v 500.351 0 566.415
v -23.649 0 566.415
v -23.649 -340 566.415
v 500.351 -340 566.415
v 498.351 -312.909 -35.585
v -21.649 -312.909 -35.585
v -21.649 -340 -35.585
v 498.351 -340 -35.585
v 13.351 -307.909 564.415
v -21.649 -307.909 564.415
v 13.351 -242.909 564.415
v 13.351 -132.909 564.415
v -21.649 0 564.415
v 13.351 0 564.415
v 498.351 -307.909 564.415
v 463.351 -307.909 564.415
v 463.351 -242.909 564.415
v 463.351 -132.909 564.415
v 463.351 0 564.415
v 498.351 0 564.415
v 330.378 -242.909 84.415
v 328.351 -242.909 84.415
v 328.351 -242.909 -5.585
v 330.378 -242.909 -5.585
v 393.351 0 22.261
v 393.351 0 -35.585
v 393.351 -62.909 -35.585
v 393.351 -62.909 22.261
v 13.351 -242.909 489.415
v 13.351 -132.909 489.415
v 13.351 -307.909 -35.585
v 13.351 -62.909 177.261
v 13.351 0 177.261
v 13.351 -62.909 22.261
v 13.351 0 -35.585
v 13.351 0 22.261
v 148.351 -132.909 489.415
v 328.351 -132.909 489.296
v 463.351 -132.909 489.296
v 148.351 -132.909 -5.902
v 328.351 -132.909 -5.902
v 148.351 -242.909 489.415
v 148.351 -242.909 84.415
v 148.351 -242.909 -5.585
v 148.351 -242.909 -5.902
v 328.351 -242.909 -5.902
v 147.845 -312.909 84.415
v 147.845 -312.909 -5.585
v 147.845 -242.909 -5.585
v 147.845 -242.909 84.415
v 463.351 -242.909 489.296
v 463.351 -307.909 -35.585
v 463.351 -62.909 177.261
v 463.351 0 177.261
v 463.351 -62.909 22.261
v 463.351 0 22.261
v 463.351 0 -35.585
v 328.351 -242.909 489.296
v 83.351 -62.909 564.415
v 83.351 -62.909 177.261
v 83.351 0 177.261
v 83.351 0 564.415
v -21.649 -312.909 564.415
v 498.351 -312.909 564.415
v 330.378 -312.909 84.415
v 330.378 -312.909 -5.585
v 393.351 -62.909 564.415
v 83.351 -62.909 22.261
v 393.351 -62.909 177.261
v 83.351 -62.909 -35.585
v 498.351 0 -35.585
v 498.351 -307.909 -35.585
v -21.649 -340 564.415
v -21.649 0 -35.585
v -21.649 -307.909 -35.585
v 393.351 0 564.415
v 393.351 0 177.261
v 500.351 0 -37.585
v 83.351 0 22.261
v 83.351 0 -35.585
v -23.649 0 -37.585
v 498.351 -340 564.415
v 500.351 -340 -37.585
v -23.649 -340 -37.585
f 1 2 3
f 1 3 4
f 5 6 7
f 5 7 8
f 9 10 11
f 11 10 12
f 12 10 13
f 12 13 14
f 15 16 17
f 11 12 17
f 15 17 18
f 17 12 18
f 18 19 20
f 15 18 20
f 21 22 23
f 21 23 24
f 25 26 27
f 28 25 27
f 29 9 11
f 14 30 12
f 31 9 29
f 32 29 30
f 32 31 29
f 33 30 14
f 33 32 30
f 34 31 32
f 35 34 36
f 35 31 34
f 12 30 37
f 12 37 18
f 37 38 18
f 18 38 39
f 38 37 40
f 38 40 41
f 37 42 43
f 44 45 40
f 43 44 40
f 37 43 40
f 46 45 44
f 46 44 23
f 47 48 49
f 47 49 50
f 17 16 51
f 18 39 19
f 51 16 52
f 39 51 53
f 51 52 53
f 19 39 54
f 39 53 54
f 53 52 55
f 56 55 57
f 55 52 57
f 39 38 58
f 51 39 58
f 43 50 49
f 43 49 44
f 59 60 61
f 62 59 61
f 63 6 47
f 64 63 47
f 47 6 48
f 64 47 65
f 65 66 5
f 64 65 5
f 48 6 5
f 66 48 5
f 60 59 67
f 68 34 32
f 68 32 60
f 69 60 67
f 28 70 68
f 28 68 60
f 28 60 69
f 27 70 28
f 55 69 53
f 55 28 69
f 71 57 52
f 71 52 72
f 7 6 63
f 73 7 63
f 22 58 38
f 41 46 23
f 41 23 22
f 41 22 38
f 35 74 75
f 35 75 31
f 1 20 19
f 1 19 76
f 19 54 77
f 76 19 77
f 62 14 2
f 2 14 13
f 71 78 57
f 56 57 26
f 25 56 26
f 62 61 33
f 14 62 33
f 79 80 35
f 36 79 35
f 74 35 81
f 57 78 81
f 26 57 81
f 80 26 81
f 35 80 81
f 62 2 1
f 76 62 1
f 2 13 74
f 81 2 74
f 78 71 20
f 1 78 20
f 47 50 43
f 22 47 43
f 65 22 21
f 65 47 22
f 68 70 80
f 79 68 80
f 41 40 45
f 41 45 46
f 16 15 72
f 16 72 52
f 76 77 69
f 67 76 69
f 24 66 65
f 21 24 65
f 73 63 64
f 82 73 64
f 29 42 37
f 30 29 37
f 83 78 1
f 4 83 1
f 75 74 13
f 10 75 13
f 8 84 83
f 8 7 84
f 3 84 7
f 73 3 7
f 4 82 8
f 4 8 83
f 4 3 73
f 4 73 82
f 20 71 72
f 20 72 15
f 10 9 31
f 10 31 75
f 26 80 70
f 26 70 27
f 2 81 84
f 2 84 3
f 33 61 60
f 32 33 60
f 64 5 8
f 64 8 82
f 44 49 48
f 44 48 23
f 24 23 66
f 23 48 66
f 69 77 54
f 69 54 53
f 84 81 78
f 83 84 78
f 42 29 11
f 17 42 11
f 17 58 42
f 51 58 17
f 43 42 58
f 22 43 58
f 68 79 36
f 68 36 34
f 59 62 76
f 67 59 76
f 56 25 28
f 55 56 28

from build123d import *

# Parameters (mm, degrees)
F0_W      = 524
F0_H      = 604
F0_W_2    = 520
F0_H_2    = 600
F1_DEPTH  = 340
F2_W      = 310
F2_H      = 240
F2_W_2    = 180
F2_H_2    = 110
F2_H_3    = 5
F3_DEPTH  = 600
F2_W_3    = 65
F2_H_4    = 307.9086494446
F4_DEPTH  = 600
F5_DEPTH  = 600
F6_W      = 182.5336068869
F6_H      = 90
F7_DEPTH  = 70
F8_W      = 180
F8_H      = 29.6823031265
F9_DEPTH  = 110
F10_W     = 62.9086494446
F10_H     = 155
F11_DEPTH = 70
F12_DEPTH = 380
F13_W     = 110
F13_H     = 75
F14_DEPTH = 140
F15_W     = 110
F15_H     = 75.1196961854
F16_DEPTH = 140


with BuildPart() as f1:
    # F0 (on Front) → F1 (new body)
    with BuildSketch(Plane.XZ):
        with Locations((238.3513055446, 264.4152384256)):
            Rectangle(F0_W, F0_H)
        with Locations((238.3513055446, 264.4152384256)):
            Rectangle(F0_W_2, F0_H_2, mode=Mode.SUBTRACT)
    extrude(amount=F1_DEPTH)

    # F2 (on face) → F3 (join)
    with BuildSketch(Plane.XY.offset(-35.5847615744)):
        Polygon((-21.6486944554, -307.9086494446), (-21.6486944554, -312.9086494446), (498.3513055446, -312.9086494446), (498.3513055446, -307.9086494446), (463.3513055446, -307.9086494446), (398.3513055446, -307.9086494446), (393.3513055446, -307.9086494446), (83.3513055446, -307.9086494446), (78.3513055446, -307.9086494446), (13.3513055446, -307.9086494446), align=None)
        with Locations((238.3513055446, -187.9086494446)):
            Rectangle(F2_W, F2_H)
        with Locations((238.3513055446, -187.9086494446)):
            Rectangle(F2_W_2, F2_H_2, mode=Mode.SUBTRACT)
        with Locations((238.3513055446, -65.4086494446)):
            Rectangle(F2_W, F2_H_3)
    extrude(amount=F3_DEPTH)

    # F2 (on face) → F4 (join)
    with BuildSketch(Plane.XY.offset(-35.5847615744)):
        with Locations((45.8513055446, -153.9543247223)):
            Rectangle(F2_W_3, F2_H_4)
        with Locations((430.8513055446, -153.9543247223)):
            Rectangle(F2_W_3, F2_H_4)
    extrude(amount=F4_DEPTH)

    # F2 (on face) → F5 (join)
    with BuildSketch(Plane.XY.offset(-35.5847615744)):
        Polygon((78.3513055446, 0), (78.3513055446, -307.9086494446), (83.3513055446, -307.9086494446), (83.3513055446, -67.9086494446), (83.3513055446, -62.9086494446), (83.3513055446, 0), align=None)
        Polygon((393.3513055446, -307.9086494446), (398.3513055446, -307.9086494446), (398.3513055446, 0), (393.3513055446, 0), (393.3513055446, -62.9086494446), (393.3513055446, -67.9086494446), align=None)
    extrude(amount=F5_DEPTH)

    # F6 (on face) → F7 (cut)
    with BuildSketch(Plane.XZ.offset(312.9086494446)):
        with Locations((239.1115501523, 39.4152384256)):
            Rectangle(F6_W, F6_H)
    extrude(amount=-F7_DEPTH, mode=Mode.SUBTRACT)

    # F8 (on face) → F9 (join)
    with BuildSketch(Plane.XZ.offset(132.9086494446)):
        with Locations((238.3513055446, -20.7436100112)):
            Rectangle(F8_W, F8_H)
    extrude(amount=F9_DEPTH)

    # F10 (on face) → F11 (cut)
    with BuildSketch(Plane(origin=(393.3513055446, 0, 0), x_dir=(0, -1, 0), z_dir=(-1, 0, 0))):
        with Locations((31.4543247223, 99.7613327205)):
            Rectangle(F10_W, F10_H)
    extrude(amount=-F11_DEPTH, mode=Mode.SUBTRACT)

    # F10 (on face) → F12 (cut)
    with BuildSketch(Plane(origin=(393.3513055446, 0, 0), x_dir=(0, -1, 0), z_dir=(-1, 0, 0))):
        with Locations((31.4543247223, 99.7613327205)):
            Rectangle(F10_W, F10_H)
    extrude(amount=F12_DEPTH, mode=Mode.SUBTRACT)

    # F13 (on face) → F14 (cut)
    with BuildSketch(Plane.YZ.offset(148.3513055446)):
        with Locations((-187.9086494446, 526.9152384256)):
            Rectangle(F13_W, F13_H)
    extrude(amount=-F14_DEPTH, mode=Mode.SUBTRACT)

    # F15 (on face) → F16 (cut)
    with BuildSketch(Plane(origin=(328.3513055446, 0, 0), x_dir=(0, -1, 0), z_dir=(-1, 0, 0))):
        with Locations((187.9086494446, 526.8553903329)):
            Rectangle(F15_W, F15_H)
    extrude(amount=-F16_DEPTH, mode=Mode.SUBTRACT)


solid = f1.part
